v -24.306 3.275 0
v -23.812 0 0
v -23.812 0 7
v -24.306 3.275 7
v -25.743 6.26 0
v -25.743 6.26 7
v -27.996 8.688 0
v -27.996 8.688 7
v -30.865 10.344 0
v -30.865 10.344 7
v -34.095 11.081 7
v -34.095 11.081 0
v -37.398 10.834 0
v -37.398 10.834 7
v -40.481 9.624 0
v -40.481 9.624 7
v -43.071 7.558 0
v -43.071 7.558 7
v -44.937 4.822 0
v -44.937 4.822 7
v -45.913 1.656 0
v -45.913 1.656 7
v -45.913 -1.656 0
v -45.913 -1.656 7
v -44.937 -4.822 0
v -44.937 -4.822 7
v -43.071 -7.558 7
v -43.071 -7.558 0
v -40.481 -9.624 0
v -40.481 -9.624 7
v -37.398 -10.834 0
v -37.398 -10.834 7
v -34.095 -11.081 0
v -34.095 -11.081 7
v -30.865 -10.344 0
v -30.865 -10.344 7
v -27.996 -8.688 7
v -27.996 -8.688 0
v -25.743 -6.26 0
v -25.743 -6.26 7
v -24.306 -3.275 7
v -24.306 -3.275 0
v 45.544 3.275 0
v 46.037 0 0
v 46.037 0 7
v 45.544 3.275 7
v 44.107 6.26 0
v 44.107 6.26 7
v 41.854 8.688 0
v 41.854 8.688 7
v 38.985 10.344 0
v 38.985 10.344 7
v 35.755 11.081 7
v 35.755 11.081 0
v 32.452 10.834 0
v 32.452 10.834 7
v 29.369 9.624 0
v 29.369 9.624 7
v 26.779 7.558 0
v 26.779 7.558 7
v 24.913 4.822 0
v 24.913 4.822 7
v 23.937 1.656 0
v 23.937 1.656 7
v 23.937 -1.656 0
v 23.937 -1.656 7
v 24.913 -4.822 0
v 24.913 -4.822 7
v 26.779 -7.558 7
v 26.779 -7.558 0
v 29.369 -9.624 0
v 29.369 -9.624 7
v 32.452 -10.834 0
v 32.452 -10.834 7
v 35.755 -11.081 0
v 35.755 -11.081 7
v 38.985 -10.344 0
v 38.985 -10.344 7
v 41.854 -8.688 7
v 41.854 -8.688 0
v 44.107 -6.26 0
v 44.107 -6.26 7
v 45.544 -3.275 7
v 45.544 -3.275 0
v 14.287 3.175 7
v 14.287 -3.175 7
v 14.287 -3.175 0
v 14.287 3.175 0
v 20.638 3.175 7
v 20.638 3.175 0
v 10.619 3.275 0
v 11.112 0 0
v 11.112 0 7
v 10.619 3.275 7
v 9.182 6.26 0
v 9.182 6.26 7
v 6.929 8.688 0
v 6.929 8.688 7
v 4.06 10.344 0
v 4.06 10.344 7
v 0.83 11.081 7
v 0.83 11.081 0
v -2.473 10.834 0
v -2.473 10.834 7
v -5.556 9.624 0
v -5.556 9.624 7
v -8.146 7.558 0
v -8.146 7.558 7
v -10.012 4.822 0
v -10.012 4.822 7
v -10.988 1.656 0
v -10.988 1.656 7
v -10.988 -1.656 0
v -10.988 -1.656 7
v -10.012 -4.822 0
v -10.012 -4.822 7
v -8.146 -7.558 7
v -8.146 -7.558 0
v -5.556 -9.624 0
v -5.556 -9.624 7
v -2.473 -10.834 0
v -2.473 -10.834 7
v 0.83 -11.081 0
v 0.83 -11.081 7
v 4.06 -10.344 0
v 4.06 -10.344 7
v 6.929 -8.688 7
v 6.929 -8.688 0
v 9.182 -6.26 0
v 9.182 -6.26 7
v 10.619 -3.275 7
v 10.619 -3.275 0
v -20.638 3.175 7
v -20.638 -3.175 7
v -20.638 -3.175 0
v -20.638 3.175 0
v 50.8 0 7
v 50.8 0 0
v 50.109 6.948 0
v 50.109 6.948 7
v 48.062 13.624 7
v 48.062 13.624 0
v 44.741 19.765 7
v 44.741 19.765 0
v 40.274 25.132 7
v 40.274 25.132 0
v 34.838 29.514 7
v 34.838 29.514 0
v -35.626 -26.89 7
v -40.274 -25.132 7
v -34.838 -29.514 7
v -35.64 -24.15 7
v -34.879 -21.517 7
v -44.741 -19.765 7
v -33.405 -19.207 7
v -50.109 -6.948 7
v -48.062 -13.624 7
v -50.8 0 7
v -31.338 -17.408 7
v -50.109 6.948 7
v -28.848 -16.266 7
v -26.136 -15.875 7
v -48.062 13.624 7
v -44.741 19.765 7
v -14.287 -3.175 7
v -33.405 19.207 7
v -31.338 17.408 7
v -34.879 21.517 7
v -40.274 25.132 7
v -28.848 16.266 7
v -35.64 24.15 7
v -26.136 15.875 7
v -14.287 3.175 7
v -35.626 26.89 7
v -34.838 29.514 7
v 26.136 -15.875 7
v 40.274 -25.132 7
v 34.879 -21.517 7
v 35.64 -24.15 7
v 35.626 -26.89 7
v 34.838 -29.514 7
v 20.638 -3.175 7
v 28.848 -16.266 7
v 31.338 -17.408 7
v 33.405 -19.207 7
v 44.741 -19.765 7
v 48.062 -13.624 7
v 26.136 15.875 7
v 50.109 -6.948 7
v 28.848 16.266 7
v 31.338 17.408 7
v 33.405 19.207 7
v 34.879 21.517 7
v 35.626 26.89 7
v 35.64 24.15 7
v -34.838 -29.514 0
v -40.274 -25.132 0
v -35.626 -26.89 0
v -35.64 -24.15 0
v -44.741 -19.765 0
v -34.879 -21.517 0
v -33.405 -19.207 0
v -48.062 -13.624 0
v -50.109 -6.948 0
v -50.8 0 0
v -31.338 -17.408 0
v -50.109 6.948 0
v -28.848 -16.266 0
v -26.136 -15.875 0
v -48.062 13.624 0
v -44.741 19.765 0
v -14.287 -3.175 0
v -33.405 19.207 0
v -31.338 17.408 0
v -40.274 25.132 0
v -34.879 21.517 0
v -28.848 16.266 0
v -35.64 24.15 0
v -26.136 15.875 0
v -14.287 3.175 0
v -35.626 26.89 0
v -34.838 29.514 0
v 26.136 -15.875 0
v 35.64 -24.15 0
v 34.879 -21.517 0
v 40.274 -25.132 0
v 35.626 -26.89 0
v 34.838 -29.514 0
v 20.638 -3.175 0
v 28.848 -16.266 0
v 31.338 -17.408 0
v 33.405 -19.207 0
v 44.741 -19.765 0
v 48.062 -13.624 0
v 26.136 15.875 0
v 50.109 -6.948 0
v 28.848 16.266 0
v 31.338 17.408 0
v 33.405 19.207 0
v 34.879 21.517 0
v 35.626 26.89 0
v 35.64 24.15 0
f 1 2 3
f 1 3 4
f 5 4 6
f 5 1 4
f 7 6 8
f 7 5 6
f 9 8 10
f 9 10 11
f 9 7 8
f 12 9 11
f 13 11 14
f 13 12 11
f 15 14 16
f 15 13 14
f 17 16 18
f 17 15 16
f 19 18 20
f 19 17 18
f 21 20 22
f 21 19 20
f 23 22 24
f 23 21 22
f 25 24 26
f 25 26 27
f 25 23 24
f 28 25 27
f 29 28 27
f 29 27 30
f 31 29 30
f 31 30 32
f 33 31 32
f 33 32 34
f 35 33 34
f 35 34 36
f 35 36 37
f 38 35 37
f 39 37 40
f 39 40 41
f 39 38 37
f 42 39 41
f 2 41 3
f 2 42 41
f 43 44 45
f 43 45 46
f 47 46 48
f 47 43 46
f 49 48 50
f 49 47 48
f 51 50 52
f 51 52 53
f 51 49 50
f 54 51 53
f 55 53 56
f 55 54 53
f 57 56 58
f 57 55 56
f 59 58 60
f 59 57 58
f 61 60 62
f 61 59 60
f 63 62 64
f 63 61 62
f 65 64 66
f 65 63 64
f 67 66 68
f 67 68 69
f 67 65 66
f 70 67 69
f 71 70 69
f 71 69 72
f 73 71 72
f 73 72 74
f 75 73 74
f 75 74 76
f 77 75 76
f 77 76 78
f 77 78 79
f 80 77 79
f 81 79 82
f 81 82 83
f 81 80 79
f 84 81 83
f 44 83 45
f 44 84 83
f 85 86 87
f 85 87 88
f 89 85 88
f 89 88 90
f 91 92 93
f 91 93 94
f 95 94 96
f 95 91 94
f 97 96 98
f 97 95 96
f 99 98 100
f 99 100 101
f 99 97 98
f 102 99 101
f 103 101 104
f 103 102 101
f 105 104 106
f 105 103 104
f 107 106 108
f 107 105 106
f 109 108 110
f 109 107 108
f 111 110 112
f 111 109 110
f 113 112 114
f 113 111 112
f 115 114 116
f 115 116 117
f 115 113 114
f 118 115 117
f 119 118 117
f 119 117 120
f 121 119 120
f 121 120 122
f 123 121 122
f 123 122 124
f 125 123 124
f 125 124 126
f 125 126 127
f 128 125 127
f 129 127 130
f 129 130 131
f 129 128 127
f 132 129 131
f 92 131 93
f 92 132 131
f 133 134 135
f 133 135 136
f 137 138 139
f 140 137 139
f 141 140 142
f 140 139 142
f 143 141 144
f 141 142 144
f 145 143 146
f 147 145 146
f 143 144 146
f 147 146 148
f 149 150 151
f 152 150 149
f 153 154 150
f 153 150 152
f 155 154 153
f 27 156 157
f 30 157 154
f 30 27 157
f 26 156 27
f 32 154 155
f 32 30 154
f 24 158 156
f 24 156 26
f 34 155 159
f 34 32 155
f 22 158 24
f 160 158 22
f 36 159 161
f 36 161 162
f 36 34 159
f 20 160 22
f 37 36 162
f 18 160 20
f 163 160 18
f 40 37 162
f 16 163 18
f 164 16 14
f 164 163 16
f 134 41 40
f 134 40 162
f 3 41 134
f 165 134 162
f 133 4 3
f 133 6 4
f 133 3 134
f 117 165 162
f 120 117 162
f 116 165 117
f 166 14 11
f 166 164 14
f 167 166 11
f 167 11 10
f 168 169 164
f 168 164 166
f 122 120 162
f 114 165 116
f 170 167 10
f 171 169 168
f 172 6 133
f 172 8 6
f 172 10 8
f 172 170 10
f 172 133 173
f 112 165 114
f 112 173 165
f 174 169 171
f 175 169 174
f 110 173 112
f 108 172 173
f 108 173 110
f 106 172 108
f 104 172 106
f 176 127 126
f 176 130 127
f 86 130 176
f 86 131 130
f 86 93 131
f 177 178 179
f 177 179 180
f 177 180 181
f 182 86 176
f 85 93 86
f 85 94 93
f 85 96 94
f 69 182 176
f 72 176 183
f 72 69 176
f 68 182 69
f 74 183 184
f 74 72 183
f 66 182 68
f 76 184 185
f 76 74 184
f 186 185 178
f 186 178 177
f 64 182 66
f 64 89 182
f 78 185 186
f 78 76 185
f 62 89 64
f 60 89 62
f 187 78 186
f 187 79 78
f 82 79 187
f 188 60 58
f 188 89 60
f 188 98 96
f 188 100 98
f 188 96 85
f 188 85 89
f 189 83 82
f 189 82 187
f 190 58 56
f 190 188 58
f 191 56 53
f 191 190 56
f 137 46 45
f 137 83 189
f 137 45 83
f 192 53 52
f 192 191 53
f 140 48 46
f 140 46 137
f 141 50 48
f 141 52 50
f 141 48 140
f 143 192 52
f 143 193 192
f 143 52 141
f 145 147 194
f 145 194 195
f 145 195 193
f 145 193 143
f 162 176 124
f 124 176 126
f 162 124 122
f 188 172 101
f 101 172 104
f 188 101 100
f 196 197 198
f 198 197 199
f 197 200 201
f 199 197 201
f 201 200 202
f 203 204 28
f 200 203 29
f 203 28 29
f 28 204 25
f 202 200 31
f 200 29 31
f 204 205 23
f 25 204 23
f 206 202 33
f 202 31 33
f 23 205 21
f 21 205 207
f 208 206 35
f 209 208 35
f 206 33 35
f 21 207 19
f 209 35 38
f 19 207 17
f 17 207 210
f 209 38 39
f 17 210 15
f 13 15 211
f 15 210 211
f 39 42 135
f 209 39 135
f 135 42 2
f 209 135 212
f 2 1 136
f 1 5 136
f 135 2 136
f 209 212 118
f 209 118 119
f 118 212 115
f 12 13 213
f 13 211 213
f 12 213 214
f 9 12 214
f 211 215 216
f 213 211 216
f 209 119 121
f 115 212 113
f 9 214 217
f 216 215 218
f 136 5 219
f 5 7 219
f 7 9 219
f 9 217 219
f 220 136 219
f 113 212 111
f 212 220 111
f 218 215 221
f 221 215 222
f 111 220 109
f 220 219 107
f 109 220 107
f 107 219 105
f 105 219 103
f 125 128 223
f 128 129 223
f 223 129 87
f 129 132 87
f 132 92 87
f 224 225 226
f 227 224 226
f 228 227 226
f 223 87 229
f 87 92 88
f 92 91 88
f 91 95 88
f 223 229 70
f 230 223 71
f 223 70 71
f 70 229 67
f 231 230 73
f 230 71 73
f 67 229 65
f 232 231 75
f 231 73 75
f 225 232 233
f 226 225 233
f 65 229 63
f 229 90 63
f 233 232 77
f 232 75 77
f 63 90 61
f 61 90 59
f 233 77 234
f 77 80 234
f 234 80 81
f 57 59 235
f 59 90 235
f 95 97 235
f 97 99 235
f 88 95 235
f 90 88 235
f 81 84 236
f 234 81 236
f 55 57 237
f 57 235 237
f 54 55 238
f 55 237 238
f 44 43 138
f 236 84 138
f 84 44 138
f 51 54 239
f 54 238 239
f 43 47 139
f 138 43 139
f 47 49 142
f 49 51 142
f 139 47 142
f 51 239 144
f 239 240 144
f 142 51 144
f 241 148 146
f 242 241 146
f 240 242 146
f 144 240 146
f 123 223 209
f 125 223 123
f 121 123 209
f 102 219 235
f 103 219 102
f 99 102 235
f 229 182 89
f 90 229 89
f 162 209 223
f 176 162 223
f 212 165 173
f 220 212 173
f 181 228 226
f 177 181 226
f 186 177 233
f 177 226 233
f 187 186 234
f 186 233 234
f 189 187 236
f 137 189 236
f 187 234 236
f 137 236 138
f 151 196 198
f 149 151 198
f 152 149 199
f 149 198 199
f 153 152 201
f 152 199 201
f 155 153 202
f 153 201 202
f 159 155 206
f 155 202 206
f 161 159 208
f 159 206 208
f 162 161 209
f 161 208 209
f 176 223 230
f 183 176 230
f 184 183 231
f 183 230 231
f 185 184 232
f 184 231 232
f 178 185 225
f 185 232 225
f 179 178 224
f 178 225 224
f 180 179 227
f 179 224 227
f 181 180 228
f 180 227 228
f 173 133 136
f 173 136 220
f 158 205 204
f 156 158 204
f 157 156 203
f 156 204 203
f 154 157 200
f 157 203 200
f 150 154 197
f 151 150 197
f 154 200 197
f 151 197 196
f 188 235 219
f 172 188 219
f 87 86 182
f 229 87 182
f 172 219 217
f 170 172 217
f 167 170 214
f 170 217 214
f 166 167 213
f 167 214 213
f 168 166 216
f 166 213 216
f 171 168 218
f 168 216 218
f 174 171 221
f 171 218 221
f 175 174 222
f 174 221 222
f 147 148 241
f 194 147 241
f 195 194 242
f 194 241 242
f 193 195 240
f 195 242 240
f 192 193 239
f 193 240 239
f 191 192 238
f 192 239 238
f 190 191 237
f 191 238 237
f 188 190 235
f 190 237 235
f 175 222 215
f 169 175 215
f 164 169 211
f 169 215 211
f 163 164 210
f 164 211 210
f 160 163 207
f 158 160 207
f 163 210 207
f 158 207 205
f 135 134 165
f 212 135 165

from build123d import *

# Parameters (mm, degrees)
F0_R     = 11.1125
F1_DEPTH = 7
F2_W     = 6.35
F2_H     = 6.35
F3_DEPTH = 7


with BuildPart() as f1:
    # F0 (on Top) → F1 (new body)
    with BuildSketch(Plane.XY):
        with BuildLine():
            ThreePointArc((-50.8, 0), (-46.15032, -11.22532), (-34.925, -15.875))
            Line((-34.925, -15.875), (-26.135577, -15.875))
            Line((-26.135577, -15.875), (26.135577, -15.875))
            Line((26.135577, -15.875), (34.925, -15.875))
            ThreePointArc((34.925, -15.875), (46.15032, -11.22532), (50.8, 0))
            ThreePointArc((50.8, 0), (46.15032, 11.22532), (34.925, 15.875))
            Line((34.925, 15.875), (26.135577, 15.875))
            Line((26.135577, 15.875), (-26.135577, 15.875))
            ThreePointArc((-26.135577, 15.875), (-34.22483, 20.309354), (-34.837518, 29.513925))
            ThreePointArc((-34.837518, 29.513925), (-46.553742, 16.777013), (-50.8, 0))
        make_face()
        with Locations((-34.925, 0)):
            Circle(F0_R, mode=Mode.SUBTRACT)
        Circle(F0_R, mode=Mode.SUBTRACT)
        with Locations((34.925, 0)):
            Circle(F0_R, mode=Mode.SUBTRACT)
        with BuildLine():
            Line((-26.135577, -15.875), (-34.925, -15.875))
            ThreePointArc((-34.925, -15.875), (-46.15032, -11.22532), (-50.8, 0))
            ThreePointArc((-50.8, 0), (-46.553742, -16.777013), (-34.837518, -29.513925))
            ThreePointArc((-34.837518, -29.513925), (-34.22483, -20.309354), (-26.135577, -15.875))
        make_face()
        with BuildLine():
            Line((34.925, -15.875), (26.135577, -15.875))
            ThreePointArc((26.135577, -15.875), (34.22483, -20.309354), (34.837518, -29.513925))
            ThreePointArc((34.837518, -29.513925), (46.553742, -16.777013), (50.8, 0))
            ThreePointArc((50.8, 0), (46.15032, -11.22532), (34.925, -15.875))
        make_face()
        with BuildLine():
            ThreePointArc((34.925, 15.875), (46.15032, 11.22532), (50.8, 0))
            ThreePointArc((50.8, 0), (46.553742, 16.777013), (34.837518, 29.513925))
            ThreePointArc((34.837518, 29.513925), (34.22483, 20.309354), (26.135577, 15.875))
            Line((26.135577, 15.875), (34.925, 15.875))
        make_face()
    extrude(amount=F1_DEPTH)

    # F2 (on face) → F3 (cut, through all)
    with BuildSketch(Plane.XY.offset(7)):
        with Locations((17.4625, 0)):
            Rectangle(F2_W, F2_H)
        with Locations((-17.4625, 0)):
            Rectangle(F2_W, F2_H)
    extrude(amount=-F3_DEPTH, mode=Mode.SUBTRACT)


solid = f1.part
